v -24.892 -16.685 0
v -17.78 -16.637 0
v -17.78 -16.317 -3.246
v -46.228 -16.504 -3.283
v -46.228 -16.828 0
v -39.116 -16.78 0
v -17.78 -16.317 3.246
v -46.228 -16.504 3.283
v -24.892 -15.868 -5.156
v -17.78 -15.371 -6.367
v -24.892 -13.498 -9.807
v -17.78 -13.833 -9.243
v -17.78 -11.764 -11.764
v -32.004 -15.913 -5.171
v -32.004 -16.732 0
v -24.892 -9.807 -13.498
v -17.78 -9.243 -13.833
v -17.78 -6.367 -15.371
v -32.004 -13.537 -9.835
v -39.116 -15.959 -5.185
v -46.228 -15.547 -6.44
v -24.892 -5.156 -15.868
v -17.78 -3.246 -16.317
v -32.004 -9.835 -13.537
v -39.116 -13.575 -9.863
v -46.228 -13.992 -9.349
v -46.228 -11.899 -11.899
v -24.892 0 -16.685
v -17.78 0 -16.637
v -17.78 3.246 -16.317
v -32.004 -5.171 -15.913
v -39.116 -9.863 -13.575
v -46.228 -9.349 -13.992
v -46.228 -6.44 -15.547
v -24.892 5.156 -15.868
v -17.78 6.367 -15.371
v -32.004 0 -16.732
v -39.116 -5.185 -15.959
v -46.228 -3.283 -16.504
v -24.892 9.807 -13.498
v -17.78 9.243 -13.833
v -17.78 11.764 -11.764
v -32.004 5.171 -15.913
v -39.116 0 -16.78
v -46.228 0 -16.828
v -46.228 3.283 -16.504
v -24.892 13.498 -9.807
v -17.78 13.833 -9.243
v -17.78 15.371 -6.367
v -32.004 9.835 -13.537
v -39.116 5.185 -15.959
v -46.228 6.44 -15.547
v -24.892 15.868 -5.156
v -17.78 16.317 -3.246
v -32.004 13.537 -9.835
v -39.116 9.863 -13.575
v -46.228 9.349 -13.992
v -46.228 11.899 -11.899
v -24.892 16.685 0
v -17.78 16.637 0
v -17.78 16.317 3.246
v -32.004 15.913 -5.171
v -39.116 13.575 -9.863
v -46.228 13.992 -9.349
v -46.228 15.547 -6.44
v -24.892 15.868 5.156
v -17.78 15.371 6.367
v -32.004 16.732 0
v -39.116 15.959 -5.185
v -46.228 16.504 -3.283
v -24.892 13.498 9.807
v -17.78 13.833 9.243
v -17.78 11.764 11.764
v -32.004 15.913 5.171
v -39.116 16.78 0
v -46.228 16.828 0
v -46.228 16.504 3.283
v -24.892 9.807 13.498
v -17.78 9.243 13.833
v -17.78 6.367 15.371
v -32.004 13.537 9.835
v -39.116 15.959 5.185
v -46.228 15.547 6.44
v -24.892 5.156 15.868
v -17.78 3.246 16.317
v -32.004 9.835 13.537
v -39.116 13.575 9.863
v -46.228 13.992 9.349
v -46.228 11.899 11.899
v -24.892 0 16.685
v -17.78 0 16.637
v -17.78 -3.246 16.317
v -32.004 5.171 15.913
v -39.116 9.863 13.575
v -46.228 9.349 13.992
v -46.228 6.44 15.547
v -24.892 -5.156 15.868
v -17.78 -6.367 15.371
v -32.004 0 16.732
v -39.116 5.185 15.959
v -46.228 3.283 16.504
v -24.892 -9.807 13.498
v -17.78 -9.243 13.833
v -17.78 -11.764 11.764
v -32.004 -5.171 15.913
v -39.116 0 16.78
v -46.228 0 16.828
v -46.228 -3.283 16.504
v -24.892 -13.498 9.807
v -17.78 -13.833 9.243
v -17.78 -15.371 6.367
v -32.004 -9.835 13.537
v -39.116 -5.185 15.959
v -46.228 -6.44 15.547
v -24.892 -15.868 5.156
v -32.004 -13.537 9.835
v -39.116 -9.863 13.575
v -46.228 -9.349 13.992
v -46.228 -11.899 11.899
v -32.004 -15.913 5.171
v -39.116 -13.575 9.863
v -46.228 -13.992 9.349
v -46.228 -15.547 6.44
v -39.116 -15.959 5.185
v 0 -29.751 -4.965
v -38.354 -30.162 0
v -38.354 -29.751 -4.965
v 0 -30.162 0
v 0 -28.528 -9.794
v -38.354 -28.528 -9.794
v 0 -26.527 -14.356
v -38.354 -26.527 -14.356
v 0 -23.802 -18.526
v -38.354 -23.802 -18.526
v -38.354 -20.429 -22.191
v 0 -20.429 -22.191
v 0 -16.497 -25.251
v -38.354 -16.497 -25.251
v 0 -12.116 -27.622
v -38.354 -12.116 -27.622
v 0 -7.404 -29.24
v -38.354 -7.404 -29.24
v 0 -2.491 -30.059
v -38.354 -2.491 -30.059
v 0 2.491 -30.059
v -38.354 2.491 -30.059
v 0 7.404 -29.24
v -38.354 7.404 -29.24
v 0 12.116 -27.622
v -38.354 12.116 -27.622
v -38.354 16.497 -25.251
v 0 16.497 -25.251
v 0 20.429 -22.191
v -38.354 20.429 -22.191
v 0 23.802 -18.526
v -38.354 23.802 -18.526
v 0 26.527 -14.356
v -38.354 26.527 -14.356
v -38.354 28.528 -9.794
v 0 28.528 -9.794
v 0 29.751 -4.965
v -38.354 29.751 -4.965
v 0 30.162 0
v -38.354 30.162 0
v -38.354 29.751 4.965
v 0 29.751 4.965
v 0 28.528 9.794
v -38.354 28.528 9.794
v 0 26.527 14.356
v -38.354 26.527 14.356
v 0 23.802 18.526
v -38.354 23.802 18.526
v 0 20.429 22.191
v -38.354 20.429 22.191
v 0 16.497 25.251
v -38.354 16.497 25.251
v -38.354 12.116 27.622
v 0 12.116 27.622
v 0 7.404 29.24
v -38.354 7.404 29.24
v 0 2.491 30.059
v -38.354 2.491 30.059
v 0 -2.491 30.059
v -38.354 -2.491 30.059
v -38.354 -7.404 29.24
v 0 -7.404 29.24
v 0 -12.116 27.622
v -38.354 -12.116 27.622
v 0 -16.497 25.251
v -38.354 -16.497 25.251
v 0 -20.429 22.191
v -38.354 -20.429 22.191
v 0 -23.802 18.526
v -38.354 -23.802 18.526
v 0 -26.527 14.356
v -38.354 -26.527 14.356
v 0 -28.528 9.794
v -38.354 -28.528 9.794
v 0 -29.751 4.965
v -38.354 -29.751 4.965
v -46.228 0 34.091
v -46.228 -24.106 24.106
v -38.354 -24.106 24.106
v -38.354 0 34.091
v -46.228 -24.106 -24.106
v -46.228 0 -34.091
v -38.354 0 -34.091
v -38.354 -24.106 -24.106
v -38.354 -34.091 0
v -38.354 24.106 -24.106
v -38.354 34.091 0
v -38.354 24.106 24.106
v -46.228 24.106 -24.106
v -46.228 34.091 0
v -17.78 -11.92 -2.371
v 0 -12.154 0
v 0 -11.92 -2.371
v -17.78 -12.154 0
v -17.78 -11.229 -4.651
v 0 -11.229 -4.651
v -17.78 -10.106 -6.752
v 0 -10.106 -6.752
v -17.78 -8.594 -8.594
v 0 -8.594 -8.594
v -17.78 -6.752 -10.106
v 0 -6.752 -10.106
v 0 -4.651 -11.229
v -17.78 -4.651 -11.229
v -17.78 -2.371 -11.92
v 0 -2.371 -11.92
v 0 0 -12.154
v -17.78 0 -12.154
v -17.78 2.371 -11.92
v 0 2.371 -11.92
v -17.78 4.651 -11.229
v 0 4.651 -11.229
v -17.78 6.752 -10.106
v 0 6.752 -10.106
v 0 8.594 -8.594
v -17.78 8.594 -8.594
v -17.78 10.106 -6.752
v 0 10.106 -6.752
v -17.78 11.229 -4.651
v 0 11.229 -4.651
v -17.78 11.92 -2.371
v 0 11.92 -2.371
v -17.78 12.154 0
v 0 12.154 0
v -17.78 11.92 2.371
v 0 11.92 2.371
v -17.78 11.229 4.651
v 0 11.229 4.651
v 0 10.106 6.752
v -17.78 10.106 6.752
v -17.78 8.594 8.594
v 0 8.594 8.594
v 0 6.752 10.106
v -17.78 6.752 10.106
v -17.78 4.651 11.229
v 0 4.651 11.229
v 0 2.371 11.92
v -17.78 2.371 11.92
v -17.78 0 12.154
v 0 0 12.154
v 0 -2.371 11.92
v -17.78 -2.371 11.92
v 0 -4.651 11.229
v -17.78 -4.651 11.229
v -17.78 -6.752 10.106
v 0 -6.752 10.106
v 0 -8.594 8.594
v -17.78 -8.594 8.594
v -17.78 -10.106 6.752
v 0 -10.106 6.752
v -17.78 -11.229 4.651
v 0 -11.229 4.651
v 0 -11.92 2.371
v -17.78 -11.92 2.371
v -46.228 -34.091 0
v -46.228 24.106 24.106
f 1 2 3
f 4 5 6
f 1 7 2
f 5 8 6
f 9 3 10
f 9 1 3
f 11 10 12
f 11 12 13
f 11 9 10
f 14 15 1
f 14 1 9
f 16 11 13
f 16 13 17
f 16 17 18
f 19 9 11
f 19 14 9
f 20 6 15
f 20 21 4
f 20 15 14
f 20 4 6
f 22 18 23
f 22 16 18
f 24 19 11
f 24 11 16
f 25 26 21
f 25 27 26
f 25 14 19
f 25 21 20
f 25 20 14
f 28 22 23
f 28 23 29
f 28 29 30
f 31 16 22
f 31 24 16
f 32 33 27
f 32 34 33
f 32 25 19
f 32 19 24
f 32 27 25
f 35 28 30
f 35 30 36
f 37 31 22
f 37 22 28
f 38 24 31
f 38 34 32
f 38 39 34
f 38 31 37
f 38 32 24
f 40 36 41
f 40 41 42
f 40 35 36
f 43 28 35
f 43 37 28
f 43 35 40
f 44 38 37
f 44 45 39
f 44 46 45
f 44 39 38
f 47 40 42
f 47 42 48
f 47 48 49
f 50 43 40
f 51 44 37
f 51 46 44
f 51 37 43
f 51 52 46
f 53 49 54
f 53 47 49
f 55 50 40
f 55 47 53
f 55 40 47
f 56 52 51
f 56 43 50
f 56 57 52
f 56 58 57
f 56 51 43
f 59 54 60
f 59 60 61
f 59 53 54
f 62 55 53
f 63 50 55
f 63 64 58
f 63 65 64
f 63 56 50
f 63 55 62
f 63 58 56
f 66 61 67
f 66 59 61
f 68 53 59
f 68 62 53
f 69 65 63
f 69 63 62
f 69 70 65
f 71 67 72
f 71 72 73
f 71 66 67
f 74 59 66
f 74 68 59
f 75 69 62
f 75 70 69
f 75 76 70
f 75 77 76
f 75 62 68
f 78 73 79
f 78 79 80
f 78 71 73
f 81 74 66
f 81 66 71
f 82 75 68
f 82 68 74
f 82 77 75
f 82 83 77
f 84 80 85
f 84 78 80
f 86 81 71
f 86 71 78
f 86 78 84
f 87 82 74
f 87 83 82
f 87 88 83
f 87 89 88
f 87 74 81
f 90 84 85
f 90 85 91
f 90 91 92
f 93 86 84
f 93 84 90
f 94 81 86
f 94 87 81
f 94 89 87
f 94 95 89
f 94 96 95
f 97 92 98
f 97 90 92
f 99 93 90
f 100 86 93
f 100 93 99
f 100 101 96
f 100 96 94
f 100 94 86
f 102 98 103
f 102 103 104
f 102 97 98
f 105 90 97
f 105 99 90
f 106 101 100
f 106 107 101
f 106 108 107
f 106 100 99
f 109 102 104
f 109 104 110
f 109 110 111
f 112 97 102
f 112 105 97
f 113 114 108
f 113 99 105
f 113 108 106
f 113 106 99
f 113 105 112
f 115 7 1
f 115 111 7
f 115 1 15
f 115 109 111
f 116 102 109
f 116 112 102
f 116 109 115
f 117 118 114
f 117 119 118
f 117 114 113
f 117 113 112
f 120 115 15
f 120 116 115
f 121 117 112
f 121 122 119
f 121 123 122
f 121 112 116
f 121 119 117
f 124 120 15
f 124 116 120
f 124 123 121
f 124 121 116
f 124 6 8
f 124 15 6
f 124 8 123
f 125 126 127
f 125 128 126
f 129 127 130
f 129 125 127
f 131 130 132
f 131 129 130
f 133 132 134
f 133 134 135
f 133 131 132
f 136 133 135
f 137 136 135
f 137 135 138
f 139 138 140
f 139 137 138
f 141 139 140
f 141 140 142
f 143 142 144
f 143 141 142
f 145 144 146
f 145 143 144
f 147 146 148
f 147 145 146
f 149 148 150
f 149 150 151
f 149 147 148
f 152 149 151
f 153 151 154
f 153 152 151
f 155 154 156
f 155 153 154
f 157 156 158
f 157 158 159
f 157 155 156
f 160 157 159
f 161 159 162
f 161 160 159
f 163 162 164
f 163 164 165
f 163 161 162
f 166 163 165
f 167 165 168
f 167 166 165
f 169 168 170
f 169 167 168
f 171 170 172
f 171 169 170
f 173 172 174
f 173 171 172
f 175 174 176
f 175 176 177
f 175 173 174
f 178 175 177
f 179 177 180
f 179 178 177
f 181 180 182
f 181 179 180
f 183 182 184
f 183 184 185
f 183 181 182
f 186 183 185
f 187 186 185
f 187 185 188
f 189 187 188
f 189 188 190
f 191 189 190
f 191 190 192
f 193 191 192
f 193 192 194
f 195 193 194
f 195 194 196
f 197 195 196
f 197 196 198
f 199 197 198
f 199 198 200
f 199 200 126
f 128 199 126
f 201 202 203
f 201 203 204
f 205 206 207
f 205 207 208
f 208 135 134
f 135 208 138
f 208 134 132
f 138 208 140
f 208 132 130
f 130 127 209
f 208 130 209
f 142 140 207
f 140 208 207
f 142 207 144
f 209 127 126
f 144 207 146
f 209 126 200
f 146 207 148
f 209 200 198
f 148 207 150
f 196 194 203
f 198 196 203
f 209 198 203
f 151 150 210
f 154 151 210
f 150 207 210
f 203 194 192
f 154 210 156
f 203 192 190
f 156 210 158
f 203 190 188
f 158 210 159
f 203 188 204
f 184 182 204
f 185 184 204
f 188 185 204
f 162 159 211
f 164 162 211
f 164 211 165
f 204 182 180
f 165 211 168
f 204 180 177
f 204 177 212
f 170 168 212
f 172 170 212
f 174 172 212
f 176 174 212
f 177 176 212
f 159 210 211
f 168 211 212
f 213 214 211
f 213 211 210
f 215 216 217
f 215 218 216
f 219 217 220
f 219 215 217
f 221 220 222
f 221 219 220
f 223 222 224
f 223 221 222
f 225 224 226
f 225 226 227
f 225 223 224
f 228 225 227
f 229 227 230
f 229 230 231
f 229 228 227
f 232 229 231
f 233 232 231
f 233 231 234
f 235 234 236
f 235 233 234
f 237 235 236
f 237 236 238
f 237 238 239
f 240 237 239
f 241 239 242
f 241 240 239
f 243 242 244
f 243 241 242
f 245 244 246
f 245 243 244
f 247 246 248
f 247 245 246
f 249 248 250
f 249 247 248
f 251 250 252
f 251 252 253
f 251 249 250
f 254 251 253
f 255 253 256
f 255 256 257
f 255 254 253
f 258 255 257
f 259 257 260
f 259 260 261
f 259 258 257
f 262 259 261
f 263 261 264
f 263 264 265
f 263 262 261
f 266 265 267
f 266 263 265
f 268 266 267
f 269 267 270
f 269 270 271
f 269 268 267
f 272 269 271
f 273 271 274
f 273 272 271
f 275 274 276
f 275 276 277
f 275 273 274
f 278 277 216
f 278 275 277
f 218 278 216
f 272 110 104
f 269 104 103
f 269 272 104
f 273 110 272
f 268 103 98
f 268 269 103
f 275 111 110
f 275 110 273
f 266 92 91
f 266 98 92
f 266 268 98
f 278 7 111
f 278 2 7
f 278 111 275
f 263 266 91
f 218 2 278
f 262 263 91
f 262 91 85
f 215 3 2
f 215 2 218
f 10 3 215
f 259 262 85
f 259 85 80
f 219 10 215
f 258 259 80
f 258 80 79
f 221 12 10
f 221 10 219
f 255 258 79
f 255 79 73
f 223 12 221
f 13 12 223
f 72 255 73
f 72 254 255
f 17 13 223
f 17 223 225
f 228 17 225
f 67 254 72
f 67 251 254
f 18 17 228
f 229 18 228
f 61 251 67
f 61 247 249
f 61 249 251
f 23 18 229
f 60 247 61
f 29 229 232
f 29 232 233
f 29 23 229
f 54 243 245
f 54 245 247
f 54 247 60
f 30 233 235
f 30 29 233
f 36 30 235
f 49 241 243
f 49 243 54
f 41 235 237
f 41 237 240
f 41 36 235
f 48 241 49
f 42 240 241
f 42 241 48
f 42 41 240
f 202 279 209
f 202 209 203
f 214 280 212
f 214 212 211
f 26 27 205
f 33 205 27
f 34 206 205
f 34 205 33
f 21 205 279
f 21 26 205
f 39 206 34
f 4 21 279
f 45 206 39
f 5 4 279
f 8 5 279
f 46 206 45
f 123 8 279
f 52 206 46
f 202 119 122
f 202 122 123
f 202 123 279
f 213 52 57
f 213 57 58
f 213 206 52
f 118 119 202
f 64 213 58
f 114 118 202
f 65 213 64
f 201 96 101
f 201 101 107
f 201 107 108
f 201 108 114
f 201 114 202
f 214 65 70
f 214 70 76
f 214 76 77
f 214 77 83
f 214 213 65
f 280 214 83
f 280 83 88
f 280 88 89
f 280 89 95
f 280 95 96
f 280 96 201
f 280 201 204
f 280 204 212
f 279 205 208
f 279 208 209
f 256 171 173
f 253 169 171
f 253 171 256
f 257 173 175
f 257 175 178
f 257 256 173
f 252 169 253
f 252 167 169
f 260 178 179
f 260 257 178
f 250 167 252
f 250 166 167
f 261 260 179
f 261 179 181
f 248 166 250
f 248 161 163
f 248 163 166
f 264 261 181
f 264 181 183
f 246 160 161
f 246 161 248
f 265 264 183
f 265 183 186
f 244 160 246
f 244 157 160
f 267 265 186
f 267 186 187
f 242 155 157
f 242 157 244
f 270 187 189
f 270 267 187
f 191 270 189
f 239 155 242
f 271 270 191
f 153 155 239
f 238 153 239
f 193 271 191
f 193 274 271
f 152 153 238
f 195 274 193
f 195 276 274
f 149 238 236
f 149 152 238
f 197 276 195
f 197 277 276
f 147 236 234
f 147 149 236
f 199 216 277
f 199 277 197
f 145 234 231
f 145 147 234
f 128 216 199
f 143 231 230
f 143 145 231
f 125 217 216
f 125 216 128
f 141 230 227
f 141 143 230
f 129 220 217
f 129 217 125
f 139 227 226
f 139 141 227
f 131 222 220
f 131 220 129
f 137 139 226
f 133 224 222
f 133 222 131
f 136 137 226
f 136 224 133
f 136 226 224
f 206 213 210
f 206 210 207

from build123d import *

# Parameters (mm, degrees)
SKETCH2_R           = 16.8275
BOSS_EXTRUDE1_DEPTH = 7.874


with BuildPart() as part:
    # Sketch1 → Revolve1 (revolve)
    with BuildSketch(Plane.XY):
        Polygon((-46.228, -30.1625), (0, -30.1625), (0, -12.1539), (-17.78, -12.1539), (-17.78, -16.637), (-46.228, -16.8275), align=None)
    revolve(axis=Axis((-46.228, 0, 0), (1, 0, 0)))

    # Sketch2 → Boss-Extrude1 (add)
    with BuildSketch(Plane.ZY.offset(46.228)):
        Polygon((0, 34.09102474), (-24.105994772, 24.105994772), (-34.09102474, 0), (-24.105994772, -24.105994772), (0, -34.09102474), (24.105994772, -24.105994772), (34.09102474, 0), (24.105994772, 24.105994772), align=None)
        Circle(SKETCH2_R, mode=Mode.SUBTRACT)
    extrude(amount=-BOSS_EXTRUDE1_DEPTH)


solid = part.part
